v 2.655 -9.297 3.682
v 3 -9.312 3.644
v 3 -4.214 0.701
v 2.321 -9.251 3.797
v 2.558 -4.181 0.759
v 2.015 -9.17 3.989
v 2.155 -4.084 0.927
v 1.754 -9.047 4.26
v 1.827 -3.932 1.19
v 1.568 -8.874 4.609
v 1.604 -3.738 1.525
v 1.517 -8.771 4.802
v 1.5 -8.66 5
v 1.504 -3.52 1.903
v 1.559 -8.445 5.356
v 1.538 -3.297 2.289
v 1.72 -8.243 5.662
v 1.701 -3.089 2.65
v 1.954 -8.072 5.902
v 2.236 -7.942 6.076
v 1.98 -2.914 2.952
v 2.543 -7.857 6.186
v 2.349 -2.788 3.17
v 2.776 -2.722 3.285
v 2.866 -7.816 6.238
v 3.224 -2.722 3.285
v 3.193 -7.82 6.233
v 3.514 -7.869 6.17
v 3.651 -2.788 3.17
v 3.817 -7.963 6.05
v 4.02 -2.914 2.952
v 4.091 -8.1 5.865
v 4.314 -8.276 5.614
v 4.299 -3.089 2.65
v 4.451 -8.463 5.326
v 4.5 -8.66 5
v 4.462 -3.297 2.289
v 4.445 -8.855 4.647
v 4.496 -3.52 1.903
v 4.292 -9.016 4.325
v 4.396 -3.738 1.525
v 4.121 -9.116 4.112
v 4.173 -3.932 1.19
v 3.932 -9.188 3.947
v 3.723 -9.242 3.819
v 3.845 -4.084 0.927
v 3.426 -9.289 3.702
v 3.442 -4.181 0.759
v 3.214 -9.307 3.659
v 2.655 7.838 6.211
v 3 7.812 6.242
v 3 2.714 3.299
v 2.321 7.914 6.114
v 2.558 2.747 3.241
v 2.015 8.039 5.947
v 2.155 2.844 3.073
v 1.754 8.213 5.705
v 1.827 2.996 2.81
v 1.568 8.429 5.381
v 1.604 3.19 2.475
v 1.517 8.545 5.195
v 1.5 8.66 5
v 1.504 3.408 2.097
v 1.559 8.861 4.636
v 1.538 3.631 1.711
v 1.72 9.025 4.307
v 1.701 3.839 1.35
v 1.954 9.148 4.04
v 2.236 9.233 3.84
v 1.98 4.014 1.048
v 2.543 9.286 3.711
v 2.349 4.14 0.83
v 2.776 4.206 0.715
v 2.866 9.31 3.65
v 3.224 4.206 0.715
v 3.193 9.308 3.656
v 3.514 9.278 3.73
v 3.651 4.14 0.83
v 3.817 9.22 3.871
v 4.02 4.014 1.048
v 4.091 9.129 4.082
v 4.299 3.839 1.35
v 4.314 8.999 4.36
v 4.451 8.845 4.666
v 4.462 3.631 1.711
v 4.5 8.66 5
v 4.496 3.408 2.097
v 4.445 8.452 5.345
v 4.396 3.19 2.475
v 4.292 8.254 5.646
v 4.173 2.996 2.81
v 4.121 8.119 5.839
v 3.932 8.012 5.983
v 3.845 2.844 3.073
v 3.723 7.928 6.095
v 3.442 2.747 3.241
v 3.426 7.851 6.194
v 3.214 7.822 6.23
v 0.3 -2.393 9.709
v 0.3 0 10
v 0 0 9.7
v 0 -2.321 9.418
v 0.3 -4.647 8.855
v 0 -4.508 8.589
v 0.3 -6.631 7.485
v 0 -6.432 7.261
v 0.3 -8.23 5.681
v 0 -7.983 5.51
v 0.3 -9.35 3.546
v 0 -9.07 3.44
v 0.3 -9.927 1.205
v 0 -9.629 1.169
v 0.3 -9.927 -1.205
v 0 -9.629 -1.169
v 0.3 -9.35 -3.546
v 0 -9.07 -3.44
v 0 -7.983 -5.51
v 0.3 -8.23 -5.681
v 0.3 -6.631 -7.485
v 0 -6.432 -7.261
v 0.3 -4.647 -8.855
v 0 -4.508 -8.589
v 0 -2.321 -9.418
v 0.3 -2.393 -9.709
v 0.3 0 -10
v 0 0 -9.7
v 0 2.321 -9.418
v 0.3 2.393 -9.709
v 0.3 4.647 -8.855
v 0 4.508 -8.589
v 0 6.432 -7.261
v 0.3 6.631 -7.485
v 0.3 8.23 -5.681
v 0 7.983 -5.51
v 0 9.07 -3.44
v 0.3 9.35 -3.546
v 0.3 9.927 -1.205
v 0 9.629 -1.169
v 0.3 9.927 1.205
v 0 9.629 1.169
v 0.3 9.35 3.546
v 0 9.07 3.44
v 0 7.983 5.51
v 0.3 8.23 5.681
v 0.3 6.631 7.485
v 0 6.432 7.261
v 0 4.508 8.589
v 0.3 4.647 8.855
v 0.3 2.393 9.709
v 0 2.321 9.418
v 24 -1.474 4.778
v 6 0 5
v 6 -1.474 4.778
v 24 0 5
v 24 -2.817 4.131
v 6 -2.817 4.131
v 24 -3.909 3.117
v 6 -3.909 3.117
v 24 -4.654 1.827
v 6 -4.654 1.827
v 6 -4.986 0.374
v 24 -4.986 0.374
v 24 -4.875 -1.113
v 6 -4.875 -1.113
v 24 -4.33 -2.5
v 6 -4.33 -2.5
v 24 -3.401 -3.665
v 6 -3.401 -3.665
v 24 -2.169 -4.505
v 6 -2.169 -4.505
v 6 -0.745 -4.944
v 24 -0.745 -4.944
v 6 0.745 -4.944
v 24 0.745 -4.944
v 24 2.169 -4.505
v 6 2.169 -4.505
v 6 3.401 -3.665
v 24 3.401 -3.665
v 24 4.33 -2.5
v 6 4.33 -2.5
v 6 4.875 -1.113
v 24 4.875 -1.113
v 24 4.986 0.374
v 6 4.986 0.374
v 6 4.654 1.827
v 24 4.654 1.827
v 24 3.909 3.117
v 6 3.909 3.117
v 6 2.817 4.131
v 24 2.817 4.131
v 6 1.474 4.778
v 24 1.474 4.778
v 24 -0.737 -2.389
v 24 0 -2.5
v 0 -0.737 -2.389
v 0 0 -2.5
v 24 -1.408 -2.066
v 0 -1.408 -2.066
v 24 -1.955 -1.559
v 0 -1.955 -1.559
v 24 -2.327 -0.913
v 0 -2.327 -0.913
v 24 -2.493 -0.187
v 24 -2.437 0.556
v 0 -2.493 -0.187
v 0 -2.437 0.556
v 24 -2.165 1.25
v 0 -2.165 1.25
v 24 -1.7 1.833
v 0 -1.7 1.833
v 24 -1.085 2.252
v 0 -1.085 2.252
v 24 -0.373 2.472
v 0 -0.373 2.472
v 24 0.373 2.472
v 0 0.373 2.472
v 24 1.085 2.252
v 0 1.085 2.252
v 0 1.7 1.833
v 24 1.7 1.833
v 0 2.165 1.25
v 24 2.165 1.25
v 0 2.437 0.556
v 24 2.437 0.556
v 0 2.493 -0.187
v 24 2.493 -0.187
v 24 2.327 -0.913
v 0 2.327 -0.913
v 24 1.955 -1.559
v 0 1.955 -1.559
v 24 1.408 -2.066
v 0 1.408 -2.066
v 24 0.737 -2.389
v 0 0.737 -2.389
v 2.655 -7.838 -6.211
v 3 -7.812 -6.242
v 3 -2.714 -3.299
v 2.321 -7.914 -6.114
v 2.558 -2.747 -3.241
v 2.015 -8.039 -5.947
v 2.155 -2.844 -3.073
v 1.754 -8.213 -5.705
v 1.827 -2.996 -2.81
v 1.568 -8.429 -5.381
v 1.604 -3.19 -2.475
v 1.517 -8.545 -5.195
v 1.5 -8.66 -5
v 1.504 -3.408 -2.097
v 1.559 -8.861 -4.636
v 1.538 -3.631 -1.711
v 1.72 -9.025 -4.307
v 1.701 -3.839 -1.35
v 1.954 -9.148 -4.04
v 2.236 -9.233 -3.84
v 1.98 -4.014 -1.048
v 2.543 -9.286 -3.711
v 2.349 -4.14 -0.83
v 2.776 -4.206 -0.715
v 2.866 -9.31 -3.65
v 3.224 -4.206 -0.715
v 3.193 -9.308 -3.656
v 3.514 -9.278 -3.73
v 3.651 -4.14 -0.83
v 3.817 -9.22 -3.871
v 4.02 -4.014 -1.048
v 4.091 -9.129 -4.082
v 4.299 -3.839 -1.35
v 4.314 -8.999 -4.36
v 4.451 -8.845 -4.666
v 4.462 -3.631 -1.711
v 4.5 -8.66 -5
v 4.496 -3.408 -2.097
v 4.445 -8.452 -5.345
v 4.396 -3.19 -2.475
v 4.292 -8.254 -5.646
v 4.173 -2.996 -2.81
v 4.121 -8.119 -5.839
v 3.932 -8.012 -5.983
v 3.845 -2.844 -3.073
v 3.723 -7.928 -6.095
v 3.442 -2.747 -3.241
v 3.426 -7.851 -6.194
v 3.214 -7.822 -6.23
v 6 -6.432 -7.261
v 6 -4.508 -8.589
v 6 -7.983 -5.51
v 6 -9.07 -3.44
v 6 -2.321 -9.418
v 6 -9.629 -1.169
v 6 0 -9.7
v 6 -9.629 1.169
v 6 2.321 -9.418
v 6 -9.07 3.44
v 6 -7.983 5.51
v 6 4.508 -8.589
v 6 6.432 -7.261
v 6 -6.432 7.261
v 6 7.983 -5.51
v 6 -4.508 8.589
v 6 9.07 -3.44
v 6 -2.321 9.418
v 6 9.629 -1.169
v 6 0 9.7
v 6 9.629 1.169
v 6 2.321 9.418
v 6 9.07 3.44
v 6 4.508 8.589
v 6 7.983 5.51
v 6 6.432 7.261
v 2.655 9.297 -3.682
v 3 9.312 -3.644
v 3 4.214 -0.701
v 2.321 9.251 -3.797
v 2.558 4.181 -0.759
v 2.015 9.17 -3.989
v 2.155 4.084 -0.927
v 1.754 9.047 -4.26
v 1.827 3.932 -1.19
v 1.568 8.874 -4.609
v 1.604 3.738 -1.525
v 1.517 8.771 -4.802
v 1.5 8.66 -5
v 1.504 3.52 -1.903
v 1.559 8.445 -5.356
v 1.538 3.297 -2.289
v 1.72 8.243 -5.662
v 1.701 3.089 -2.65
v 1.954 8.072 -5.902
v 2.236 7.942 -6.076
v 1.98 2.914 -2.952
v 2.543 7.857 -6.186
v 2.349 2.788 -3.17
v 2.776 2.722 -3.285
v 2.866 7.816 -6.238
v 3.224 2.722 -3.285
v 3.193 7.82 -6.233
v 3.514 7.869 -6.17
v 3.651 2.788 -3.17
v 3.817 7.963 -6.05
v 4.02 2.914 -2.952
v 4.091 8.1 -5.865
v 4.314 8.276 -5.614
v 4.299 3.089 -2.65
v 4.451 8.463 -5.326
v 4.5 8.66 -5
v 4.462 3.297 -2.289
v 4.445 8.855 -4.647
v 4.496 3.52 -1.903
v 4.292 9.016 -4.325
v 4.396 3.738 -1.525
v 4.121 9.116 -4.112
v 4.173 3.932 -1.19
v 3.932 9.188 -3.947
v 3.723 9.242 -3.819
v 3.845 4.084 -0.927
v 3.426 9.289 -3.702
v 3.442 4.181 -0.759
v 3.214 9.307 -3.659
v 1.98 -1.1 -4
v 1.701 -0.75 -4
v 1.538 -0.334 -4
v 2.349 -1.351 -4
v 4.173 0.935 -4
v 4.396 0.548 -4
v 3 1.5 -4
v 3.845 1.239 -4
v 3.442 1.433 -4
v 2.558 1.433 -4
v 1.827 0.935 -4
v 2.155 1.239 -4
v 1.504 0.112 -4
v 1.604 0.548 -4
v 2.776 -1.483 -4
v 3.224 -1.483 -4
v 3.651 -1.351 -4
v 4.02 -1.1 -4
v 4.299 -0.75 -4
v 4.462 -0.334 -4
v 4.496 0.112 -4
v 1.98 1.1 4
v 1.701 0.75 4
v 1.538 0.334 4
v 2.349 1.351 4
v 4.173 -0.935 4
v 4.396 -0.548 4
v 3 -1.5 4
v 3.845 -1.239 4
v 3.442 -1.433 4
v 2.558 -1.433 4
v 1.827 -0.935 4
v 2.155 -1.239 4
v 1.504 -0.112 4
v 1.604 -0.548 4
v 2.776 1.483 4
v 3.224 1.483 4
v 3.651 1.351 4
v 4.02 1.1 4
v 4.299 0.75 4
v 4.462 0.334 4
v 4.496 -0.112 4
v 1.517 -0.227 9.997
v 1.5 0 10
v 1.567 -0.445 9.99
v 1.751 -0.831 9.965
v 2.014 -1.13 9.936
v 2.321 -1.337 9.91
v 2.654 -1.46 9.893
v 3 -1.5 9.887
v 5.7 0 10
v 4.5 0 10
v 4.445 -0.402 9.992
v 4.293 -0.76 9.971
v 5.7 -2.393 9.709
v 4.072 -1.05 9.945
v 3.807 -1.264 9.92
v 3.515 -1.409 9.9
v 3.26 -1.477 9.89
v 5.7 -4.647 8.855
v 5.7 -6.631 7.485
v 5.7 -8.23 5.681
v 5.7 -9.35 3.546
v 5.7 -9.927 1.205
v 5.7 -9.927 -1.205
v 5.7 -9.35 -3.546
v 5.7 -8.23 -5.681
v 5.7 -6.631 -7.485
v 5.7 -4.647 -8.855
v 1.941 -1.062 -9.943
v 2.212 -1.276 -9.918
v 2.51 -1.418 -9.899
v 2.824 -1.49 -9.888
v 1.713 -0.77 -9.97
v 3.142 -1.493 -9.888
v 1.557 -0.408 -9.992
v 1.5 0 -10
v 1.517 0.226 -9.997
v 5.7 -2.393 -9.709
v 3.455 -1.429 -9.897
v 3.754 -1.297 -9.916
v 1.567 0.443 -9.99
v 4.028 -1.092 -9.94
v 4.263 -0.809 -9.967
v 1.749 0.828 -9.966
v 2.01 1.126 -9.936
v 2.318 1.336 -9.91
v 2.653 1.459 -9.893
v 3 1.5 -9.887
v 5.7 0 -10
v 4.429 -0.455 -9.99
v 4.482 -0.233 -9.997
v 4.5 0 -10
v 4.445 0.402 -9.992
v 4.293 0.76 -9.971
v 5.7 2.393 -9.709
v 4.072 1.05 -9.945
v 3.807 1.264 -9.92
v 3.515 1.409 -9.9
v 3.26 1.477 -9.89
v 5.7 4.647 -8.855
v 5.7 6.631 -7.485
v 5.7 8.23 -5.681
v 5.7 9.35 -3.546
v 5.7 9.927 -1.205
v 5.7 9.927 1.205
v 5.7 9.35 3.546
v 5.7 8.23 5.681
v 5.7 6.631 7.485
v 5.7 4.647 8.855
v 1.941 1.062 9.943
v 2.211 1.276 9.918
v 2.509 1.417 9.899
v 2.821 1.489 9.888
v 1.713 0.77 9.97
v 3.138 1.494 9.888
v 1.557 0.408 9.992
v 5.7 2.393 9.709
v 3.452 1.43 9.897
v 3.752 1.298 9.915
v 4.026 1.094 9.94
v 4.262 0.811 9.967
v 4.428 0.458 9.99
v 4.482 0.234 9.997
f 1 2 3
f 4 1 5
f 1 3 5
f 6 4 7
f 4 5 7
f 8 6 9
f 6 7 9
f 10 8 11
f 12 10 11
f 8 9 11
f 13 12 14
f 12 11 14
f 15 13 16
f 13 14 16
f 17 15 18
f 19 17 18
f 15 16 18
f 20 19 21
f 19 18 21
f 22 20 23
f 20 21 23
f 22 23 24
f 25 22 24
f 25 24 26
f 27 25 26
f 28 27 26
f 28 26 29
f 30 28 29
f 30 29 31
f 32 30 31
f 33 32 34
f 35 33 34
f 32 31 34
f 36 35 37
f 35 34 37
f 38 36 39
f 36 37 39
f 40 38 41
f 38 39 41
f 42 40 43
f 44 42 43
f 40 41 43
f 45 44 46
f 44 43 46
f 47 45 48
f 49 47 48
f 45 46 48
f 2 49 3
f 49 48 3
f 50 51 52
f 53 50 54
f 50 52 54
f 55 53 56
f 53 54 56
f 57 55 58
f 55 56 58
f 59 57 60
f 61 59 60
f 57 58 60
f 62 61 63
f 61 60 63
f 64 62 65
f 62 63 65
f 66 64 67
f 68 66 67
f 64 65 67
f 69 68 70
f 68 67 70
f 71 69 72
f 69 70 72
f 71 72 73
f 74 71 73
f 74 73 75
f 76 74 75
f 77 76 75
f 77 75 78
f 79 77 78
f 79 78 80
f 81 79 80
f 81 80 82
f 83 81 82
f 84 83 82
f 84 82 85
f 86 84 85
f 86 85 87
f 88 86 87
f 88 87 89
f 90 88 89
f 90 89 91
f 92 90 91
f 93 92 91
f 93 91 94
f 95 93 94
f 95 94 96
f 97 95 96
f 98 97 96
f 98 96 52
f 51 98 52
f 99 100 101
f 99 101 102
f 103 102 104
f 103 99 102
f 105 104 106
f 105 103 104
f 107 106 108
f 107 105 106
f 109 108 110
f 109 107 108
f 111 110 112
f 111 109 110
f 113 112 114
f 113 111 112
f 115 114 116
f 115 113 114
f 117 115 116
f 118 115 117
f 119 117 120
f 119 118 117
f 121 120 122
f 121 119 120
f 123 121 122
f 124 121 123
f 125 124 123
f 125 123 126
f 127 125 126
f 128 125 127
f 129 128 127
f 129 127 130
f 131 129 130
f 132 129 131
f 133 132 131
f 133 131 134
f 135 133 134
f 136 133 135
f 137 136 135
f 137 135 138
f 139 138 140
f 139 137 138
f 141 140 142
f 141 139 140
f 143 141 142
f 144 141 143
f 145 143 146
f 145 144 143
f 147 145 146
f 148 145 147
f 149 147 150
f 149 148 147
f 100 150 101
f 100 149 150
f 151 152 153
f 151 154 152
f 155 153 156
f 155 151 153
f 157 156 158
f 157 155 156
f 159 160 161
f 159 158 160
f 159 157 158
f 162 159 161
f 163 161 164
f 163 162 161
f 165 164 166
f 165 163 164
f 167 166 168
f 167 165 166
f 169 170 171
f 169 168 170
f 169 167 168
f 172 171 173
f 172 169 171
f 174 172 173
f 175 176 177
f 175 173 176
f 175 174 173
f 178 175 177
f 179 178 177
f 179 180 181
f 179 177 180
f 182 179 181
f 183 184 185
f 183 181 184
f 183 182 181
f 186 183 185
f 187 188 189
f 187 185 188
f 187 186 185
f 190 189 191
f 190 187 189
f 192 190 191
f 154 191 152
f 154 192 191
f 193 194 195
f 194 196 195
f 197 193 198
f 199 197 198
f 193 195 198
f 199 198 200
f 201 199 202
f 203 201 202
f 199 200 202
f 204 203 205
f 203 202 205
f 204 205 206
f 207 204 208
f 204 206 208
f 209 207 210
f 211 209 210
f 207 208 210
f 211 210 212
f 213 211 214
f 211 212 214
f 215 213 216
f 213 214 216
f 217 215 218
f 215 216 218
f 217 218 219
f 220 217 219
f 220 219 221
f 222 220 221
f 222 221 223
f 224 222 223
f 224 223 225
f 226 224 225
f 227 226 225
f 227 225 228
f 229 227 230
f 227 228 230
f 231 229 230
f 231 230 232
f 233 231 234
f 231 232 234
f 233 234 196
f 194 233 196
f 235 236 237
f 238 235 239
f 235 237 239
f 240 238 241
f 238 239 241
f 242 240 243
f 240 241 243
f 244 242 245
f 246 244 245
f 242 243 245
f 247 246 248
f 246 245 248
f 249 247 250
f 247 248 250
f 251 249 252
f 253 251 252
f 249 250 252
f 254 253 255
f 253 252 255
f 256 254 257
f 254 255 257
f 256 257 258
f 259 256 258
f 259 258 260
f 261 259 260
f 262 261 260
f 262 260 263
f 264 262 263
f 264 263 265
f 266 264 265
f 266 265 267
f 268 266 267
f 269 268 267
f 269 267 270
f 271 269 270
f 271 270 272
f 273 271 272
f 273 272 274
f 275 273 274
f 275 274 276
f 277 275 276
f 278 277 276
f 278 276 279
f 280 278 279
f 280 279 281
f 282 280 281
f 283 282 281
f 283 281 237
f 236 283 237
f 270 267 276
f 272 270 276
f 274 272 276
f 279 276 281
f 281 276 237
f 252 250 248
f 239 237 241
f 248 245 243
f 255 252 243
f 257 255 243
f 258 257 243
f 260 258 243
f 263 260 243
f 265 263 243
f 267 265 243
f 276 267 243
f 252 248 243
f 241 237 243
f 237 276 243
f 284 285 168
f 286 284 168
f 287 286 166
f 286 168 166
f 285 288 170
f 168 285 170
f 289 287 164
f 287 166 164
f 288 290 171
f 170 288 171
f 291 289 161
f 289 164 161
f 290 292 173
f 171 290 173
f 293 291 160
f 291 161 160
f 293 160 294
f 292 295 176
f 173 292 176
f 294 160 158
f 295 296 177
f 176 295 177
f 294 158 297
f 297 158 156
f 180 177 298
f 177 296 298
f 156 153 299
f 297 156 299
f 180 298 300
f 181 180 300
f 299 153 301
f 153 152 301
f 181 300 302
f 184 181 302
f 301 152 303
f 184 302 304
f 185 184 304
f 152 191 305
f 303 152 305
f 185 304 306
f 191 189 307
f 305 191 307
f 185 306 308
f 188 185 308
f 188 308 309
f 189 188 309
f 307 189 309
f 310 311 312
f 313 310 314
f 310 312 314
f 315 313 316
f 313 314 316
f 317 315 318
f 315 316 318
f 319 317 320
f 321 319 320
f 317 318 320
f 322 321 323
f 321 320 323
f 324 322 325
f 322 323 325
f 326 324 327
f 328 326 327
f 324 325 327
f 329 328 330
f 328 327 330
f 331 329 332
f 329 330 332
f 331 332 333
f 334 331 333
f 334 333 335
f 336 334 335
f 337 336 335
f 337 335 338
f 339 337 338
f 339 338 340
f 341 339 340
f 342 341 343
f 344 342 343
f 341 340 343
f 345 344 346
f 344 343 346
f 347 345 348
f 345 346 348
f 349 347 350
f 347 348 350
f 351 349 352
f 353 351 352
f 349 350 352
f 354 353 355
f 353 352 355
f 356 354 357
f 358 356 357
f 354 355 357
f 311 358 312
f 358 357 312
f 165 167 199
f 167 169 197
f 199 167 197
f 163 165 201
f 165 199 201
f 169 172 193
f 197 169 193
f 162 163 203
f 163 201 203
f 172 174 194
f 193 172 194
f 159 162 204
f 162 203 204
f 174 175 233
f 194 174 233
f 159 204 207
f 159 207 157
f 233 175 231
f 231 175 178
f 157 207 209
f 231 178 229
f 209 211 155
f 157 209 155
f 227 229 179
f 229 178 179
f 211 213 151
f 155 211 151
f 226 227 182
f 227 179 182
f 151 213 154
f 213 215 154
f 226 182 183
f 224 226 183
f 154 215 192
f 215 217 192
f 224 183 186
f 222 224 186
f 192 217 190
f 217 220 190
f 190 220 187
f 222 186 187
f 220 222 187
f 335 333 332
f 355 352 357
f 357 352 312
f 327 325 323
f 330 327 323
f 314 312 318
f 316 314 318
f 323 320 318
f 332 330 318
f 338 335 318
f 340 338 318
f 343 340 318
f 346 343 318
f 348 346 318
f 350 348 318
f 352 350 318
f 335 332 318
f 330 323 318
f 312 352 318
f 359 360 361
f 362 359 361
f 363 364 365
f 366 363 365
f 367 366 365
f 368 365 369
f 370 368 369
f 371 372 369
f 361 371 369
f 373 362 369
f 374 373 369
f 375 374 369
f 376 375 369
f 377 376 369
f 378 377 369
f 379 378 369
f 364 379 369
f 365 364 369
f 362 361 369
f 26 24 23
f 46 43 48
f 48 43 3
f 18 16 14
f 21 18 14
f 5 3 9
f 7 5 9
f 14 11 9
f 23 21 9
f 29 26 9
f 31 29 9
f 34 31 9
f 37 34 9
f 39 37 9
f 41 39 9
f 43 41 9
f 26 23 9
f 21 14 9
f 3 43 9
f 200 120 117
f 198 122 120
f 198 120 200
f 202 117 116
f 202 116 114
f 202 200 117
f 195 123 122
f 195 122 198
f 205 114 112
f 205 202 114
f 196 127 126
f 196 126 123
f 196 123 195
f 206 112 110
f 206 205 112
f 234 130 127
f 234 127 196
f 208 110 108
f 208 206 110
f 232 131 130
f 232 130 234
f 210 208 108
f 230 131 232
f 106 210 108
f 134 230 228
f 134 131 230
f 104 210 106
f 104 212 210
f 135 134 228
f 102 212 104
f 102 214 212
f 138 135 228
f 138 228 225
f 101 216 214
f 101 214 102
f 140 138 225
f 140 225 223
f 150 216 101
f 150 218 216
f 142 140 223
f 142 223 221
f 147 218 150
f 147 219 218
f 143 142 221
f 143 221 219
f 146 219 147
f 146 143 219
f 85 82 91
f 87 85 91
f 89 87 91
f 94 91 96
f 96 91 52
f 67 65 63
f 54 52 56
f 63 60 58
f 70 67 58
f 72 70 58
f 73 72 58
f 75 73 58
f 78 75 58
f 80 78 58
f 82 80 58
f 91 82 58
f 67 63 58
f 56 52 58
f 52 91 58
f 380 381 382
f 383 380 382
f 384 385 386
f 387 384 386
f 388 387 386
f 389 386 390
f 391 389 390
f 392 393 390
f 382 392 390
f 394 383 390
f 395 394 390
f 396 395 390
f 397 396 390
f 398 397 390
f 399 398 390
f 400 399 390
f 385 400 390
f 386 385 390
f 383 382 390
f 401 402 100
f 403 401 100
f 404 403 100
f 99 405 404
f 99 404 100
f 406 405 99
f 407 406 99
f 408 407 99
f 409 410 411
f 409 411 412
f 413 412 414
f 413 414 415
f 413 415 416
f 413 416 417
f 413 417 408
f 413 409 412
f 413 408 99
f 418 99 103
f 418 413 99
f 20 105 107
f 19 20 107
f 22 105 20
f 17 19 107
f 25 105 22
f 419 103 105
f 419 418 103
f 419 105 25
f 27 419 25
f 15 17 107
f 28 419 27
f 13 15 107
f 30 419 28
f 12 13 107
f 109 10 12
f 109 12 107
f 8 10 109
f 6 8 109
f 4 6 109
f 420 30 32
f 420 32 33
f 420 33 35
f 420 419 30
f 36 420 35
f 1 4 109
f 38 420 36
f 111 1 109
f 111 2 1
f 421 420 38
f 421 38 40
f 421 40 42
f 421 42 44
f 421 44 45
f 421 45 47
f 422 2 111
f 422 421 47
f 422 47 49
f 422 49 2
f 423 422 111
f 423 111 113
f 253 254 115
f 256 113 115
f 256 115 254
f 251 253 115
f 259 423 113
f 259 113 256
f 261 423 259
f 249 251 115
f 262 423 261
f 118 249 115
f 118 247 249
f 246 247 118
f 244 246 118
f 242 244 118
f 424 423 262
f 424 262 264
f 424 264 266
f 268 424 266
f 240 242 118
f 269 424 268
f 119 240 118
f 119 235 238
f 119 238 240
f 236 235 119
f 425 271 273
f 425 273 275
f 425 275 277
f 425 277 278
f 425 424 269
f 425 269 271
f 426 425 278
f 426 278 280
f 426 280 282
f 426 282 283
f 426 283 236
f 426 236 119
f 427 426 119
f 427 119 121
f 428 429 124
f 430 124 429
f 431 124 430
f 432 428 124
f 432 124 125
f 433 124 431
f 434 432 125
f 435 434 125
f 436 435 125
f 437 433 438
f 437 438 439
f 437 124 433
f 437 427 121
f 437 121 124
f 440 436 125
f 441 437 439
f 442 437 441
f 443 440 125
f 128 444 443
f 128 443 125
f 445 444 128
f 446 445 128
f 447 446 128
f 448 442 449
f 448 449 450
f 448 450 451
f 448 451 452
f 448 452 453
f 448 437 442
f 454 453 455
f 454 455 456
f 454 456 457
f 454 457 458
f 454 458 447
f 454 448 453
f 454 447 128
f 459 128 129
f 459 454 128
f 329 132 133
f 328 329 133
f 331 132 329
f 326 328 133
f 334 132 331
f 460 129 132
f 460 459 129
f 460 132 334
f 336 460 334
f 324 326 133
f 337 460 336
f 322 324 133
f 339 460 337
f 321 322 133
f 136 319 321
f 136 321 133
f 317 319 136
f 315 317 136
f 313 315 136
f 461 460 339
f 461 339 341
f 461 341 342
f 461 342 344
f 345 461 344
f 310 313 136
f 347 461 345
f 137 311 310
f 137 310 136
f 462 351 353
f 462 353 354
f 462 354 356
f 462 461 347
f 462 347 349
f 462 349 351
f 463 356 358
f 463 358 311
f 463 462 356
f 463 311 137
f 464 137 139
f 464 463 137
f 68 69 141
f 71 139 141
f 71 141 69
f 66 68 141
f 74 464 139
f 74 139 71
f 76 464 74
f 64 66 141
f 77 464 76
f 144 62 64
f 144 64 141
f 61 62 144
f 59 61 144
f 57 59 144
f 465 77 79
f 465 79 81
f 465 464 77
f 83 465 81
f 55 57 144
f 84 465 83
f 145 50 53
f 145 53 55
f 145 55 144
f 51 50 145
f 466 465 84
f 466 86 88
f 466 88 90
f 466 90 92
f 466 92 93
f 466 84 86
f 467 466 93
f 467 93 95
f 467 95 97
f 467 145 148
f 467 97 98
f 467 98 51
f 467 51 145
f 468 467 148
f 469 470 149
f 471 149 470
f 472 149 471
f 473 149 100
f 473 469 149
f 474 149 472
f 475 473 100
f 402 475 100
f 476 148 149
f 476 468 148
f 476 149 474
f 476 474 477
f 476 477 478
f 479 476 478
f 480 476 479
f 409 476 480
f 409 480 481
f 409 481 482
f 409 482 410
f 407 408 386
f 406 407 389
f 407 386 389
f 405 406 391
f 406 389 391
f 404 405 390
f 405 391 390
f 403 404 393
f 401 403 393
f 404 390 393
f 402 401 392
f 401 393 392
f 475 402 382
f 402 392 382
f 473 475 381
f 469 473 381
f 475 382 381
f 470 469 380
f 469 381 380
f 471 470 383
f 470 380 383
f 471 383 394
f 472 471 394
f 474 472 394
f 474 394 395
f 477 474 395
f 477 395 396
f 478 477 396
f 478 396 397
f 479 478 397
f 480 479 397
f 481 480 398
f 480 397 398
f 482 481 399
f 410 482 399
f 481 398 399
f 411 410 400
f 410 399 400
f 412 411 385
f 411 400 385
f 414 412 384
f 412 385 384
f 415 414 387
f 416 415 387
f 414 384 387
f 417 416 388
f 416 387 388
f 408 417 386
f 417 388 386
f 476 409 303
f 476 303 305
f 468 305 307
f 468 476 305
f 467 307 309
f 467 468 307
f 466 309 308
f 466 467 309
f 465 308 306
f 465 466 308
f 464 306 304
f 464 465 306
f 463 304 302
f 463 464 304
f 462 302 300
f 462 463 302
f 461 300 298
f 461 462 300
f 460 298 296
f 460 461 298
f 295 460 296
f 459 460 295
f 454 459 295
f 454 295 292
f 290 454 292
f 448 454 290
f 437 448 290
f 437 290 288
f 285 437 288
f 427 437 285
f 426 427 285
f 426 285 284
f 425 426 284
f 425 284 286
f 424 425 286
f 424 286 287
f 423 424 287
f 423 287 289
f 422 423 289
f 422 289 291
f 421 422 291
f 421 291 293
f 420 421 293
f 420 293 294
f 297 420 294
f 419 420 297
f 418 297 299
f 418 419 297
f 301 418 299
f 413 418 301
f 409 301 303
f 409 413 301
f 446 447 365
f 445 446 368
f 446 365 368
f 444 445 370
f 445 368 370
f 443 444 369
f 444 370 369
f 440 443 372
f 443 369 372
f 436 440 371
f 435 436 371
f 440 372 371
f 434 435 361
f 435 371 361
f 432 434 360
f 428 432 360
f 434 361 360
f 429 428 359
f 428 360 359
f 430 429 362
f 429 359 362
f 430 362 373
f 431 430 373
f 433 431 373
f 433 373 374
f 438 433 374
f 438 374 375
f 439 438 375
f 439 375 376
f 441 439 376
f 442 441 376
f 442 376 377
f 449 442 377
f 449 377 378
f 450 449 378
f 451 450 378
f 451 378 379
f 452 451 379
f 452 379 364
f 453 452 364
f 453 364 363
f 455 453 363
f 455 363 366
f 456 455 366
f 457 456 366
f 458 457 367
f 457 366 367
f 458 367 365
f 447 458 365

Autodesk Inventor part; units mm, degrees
ref_plane "YZ Plane" through (0, 0, 0) normal (1, 0, 0) x (0, 1, 0)
ref_plane "XZ Plane" through (0, 0, 0) normal (0, 1, 0) x (-1, 0, 0)
sketch "Skizze1" plane through (0, 0, 0) normal (0, 1, 0) x (-1, 0, 0)
  line L0 (0, 0) -> (0, 10)
  line L1 (0, 10) -> (-6, 10)
  line L2 (-6, 10) -> (-6, 5)
  line L3 (-6, 5) -> (-24, 5)
  line L4 (-24, 5) -> (-24, 0)
  line L5 (-24, 0) -> (0, 0)
  dimension "d0" = 20
  dimension "d1" = 10
  dimension "d2" = 6
  dimension "d3" = 18
revolve "Umdrehung1" add sketch "Skizze1" angle 360 about axis through (24, 0, 0) along (-1, 0, 0)
sketch "Skizze2" plane through (24, 0, 0) normal (1, 0, 0) x (0, 0, -1)
  circle A0 centre (0, 0) radius 5 projected
hole "Bohrung1" at (24, 0, 0) direction (-1, 0, 0) diameter 5 depth 24
thread "Gewinde1" size "M10x1.5" class "6g" standard "ISO Metric profile" length 18
ref_plane "Arbeitsebene1" through (0, 0, 10) normal (0, 0, 1) x (1, 0, 0)
sketch "Skizze3" plane through (0, 0, 10) normal (0, 0, 1) x (1, 0, 0)
  line L0 (0, 10) -> (0, -10) projected
  point P0 (0, 0)
  point P1 (3, 0)
  point P2 (0, 0)
  dimension "d15" = 3
hole "Bohrung2" at (3, 0, 10) direction (0, 0, -1) diameter 3 depth 6
pattern_circular "Runde Anordnung1" count 6 over 360 about axis through (3, 0, 0) along (-1, 0, 0) of "Bohrung2"
chamfer "Fasen1" distance 0.3 angle 45 2 edges at (0, 0, -10) (6, 0, -10)
properties part number "1153"
